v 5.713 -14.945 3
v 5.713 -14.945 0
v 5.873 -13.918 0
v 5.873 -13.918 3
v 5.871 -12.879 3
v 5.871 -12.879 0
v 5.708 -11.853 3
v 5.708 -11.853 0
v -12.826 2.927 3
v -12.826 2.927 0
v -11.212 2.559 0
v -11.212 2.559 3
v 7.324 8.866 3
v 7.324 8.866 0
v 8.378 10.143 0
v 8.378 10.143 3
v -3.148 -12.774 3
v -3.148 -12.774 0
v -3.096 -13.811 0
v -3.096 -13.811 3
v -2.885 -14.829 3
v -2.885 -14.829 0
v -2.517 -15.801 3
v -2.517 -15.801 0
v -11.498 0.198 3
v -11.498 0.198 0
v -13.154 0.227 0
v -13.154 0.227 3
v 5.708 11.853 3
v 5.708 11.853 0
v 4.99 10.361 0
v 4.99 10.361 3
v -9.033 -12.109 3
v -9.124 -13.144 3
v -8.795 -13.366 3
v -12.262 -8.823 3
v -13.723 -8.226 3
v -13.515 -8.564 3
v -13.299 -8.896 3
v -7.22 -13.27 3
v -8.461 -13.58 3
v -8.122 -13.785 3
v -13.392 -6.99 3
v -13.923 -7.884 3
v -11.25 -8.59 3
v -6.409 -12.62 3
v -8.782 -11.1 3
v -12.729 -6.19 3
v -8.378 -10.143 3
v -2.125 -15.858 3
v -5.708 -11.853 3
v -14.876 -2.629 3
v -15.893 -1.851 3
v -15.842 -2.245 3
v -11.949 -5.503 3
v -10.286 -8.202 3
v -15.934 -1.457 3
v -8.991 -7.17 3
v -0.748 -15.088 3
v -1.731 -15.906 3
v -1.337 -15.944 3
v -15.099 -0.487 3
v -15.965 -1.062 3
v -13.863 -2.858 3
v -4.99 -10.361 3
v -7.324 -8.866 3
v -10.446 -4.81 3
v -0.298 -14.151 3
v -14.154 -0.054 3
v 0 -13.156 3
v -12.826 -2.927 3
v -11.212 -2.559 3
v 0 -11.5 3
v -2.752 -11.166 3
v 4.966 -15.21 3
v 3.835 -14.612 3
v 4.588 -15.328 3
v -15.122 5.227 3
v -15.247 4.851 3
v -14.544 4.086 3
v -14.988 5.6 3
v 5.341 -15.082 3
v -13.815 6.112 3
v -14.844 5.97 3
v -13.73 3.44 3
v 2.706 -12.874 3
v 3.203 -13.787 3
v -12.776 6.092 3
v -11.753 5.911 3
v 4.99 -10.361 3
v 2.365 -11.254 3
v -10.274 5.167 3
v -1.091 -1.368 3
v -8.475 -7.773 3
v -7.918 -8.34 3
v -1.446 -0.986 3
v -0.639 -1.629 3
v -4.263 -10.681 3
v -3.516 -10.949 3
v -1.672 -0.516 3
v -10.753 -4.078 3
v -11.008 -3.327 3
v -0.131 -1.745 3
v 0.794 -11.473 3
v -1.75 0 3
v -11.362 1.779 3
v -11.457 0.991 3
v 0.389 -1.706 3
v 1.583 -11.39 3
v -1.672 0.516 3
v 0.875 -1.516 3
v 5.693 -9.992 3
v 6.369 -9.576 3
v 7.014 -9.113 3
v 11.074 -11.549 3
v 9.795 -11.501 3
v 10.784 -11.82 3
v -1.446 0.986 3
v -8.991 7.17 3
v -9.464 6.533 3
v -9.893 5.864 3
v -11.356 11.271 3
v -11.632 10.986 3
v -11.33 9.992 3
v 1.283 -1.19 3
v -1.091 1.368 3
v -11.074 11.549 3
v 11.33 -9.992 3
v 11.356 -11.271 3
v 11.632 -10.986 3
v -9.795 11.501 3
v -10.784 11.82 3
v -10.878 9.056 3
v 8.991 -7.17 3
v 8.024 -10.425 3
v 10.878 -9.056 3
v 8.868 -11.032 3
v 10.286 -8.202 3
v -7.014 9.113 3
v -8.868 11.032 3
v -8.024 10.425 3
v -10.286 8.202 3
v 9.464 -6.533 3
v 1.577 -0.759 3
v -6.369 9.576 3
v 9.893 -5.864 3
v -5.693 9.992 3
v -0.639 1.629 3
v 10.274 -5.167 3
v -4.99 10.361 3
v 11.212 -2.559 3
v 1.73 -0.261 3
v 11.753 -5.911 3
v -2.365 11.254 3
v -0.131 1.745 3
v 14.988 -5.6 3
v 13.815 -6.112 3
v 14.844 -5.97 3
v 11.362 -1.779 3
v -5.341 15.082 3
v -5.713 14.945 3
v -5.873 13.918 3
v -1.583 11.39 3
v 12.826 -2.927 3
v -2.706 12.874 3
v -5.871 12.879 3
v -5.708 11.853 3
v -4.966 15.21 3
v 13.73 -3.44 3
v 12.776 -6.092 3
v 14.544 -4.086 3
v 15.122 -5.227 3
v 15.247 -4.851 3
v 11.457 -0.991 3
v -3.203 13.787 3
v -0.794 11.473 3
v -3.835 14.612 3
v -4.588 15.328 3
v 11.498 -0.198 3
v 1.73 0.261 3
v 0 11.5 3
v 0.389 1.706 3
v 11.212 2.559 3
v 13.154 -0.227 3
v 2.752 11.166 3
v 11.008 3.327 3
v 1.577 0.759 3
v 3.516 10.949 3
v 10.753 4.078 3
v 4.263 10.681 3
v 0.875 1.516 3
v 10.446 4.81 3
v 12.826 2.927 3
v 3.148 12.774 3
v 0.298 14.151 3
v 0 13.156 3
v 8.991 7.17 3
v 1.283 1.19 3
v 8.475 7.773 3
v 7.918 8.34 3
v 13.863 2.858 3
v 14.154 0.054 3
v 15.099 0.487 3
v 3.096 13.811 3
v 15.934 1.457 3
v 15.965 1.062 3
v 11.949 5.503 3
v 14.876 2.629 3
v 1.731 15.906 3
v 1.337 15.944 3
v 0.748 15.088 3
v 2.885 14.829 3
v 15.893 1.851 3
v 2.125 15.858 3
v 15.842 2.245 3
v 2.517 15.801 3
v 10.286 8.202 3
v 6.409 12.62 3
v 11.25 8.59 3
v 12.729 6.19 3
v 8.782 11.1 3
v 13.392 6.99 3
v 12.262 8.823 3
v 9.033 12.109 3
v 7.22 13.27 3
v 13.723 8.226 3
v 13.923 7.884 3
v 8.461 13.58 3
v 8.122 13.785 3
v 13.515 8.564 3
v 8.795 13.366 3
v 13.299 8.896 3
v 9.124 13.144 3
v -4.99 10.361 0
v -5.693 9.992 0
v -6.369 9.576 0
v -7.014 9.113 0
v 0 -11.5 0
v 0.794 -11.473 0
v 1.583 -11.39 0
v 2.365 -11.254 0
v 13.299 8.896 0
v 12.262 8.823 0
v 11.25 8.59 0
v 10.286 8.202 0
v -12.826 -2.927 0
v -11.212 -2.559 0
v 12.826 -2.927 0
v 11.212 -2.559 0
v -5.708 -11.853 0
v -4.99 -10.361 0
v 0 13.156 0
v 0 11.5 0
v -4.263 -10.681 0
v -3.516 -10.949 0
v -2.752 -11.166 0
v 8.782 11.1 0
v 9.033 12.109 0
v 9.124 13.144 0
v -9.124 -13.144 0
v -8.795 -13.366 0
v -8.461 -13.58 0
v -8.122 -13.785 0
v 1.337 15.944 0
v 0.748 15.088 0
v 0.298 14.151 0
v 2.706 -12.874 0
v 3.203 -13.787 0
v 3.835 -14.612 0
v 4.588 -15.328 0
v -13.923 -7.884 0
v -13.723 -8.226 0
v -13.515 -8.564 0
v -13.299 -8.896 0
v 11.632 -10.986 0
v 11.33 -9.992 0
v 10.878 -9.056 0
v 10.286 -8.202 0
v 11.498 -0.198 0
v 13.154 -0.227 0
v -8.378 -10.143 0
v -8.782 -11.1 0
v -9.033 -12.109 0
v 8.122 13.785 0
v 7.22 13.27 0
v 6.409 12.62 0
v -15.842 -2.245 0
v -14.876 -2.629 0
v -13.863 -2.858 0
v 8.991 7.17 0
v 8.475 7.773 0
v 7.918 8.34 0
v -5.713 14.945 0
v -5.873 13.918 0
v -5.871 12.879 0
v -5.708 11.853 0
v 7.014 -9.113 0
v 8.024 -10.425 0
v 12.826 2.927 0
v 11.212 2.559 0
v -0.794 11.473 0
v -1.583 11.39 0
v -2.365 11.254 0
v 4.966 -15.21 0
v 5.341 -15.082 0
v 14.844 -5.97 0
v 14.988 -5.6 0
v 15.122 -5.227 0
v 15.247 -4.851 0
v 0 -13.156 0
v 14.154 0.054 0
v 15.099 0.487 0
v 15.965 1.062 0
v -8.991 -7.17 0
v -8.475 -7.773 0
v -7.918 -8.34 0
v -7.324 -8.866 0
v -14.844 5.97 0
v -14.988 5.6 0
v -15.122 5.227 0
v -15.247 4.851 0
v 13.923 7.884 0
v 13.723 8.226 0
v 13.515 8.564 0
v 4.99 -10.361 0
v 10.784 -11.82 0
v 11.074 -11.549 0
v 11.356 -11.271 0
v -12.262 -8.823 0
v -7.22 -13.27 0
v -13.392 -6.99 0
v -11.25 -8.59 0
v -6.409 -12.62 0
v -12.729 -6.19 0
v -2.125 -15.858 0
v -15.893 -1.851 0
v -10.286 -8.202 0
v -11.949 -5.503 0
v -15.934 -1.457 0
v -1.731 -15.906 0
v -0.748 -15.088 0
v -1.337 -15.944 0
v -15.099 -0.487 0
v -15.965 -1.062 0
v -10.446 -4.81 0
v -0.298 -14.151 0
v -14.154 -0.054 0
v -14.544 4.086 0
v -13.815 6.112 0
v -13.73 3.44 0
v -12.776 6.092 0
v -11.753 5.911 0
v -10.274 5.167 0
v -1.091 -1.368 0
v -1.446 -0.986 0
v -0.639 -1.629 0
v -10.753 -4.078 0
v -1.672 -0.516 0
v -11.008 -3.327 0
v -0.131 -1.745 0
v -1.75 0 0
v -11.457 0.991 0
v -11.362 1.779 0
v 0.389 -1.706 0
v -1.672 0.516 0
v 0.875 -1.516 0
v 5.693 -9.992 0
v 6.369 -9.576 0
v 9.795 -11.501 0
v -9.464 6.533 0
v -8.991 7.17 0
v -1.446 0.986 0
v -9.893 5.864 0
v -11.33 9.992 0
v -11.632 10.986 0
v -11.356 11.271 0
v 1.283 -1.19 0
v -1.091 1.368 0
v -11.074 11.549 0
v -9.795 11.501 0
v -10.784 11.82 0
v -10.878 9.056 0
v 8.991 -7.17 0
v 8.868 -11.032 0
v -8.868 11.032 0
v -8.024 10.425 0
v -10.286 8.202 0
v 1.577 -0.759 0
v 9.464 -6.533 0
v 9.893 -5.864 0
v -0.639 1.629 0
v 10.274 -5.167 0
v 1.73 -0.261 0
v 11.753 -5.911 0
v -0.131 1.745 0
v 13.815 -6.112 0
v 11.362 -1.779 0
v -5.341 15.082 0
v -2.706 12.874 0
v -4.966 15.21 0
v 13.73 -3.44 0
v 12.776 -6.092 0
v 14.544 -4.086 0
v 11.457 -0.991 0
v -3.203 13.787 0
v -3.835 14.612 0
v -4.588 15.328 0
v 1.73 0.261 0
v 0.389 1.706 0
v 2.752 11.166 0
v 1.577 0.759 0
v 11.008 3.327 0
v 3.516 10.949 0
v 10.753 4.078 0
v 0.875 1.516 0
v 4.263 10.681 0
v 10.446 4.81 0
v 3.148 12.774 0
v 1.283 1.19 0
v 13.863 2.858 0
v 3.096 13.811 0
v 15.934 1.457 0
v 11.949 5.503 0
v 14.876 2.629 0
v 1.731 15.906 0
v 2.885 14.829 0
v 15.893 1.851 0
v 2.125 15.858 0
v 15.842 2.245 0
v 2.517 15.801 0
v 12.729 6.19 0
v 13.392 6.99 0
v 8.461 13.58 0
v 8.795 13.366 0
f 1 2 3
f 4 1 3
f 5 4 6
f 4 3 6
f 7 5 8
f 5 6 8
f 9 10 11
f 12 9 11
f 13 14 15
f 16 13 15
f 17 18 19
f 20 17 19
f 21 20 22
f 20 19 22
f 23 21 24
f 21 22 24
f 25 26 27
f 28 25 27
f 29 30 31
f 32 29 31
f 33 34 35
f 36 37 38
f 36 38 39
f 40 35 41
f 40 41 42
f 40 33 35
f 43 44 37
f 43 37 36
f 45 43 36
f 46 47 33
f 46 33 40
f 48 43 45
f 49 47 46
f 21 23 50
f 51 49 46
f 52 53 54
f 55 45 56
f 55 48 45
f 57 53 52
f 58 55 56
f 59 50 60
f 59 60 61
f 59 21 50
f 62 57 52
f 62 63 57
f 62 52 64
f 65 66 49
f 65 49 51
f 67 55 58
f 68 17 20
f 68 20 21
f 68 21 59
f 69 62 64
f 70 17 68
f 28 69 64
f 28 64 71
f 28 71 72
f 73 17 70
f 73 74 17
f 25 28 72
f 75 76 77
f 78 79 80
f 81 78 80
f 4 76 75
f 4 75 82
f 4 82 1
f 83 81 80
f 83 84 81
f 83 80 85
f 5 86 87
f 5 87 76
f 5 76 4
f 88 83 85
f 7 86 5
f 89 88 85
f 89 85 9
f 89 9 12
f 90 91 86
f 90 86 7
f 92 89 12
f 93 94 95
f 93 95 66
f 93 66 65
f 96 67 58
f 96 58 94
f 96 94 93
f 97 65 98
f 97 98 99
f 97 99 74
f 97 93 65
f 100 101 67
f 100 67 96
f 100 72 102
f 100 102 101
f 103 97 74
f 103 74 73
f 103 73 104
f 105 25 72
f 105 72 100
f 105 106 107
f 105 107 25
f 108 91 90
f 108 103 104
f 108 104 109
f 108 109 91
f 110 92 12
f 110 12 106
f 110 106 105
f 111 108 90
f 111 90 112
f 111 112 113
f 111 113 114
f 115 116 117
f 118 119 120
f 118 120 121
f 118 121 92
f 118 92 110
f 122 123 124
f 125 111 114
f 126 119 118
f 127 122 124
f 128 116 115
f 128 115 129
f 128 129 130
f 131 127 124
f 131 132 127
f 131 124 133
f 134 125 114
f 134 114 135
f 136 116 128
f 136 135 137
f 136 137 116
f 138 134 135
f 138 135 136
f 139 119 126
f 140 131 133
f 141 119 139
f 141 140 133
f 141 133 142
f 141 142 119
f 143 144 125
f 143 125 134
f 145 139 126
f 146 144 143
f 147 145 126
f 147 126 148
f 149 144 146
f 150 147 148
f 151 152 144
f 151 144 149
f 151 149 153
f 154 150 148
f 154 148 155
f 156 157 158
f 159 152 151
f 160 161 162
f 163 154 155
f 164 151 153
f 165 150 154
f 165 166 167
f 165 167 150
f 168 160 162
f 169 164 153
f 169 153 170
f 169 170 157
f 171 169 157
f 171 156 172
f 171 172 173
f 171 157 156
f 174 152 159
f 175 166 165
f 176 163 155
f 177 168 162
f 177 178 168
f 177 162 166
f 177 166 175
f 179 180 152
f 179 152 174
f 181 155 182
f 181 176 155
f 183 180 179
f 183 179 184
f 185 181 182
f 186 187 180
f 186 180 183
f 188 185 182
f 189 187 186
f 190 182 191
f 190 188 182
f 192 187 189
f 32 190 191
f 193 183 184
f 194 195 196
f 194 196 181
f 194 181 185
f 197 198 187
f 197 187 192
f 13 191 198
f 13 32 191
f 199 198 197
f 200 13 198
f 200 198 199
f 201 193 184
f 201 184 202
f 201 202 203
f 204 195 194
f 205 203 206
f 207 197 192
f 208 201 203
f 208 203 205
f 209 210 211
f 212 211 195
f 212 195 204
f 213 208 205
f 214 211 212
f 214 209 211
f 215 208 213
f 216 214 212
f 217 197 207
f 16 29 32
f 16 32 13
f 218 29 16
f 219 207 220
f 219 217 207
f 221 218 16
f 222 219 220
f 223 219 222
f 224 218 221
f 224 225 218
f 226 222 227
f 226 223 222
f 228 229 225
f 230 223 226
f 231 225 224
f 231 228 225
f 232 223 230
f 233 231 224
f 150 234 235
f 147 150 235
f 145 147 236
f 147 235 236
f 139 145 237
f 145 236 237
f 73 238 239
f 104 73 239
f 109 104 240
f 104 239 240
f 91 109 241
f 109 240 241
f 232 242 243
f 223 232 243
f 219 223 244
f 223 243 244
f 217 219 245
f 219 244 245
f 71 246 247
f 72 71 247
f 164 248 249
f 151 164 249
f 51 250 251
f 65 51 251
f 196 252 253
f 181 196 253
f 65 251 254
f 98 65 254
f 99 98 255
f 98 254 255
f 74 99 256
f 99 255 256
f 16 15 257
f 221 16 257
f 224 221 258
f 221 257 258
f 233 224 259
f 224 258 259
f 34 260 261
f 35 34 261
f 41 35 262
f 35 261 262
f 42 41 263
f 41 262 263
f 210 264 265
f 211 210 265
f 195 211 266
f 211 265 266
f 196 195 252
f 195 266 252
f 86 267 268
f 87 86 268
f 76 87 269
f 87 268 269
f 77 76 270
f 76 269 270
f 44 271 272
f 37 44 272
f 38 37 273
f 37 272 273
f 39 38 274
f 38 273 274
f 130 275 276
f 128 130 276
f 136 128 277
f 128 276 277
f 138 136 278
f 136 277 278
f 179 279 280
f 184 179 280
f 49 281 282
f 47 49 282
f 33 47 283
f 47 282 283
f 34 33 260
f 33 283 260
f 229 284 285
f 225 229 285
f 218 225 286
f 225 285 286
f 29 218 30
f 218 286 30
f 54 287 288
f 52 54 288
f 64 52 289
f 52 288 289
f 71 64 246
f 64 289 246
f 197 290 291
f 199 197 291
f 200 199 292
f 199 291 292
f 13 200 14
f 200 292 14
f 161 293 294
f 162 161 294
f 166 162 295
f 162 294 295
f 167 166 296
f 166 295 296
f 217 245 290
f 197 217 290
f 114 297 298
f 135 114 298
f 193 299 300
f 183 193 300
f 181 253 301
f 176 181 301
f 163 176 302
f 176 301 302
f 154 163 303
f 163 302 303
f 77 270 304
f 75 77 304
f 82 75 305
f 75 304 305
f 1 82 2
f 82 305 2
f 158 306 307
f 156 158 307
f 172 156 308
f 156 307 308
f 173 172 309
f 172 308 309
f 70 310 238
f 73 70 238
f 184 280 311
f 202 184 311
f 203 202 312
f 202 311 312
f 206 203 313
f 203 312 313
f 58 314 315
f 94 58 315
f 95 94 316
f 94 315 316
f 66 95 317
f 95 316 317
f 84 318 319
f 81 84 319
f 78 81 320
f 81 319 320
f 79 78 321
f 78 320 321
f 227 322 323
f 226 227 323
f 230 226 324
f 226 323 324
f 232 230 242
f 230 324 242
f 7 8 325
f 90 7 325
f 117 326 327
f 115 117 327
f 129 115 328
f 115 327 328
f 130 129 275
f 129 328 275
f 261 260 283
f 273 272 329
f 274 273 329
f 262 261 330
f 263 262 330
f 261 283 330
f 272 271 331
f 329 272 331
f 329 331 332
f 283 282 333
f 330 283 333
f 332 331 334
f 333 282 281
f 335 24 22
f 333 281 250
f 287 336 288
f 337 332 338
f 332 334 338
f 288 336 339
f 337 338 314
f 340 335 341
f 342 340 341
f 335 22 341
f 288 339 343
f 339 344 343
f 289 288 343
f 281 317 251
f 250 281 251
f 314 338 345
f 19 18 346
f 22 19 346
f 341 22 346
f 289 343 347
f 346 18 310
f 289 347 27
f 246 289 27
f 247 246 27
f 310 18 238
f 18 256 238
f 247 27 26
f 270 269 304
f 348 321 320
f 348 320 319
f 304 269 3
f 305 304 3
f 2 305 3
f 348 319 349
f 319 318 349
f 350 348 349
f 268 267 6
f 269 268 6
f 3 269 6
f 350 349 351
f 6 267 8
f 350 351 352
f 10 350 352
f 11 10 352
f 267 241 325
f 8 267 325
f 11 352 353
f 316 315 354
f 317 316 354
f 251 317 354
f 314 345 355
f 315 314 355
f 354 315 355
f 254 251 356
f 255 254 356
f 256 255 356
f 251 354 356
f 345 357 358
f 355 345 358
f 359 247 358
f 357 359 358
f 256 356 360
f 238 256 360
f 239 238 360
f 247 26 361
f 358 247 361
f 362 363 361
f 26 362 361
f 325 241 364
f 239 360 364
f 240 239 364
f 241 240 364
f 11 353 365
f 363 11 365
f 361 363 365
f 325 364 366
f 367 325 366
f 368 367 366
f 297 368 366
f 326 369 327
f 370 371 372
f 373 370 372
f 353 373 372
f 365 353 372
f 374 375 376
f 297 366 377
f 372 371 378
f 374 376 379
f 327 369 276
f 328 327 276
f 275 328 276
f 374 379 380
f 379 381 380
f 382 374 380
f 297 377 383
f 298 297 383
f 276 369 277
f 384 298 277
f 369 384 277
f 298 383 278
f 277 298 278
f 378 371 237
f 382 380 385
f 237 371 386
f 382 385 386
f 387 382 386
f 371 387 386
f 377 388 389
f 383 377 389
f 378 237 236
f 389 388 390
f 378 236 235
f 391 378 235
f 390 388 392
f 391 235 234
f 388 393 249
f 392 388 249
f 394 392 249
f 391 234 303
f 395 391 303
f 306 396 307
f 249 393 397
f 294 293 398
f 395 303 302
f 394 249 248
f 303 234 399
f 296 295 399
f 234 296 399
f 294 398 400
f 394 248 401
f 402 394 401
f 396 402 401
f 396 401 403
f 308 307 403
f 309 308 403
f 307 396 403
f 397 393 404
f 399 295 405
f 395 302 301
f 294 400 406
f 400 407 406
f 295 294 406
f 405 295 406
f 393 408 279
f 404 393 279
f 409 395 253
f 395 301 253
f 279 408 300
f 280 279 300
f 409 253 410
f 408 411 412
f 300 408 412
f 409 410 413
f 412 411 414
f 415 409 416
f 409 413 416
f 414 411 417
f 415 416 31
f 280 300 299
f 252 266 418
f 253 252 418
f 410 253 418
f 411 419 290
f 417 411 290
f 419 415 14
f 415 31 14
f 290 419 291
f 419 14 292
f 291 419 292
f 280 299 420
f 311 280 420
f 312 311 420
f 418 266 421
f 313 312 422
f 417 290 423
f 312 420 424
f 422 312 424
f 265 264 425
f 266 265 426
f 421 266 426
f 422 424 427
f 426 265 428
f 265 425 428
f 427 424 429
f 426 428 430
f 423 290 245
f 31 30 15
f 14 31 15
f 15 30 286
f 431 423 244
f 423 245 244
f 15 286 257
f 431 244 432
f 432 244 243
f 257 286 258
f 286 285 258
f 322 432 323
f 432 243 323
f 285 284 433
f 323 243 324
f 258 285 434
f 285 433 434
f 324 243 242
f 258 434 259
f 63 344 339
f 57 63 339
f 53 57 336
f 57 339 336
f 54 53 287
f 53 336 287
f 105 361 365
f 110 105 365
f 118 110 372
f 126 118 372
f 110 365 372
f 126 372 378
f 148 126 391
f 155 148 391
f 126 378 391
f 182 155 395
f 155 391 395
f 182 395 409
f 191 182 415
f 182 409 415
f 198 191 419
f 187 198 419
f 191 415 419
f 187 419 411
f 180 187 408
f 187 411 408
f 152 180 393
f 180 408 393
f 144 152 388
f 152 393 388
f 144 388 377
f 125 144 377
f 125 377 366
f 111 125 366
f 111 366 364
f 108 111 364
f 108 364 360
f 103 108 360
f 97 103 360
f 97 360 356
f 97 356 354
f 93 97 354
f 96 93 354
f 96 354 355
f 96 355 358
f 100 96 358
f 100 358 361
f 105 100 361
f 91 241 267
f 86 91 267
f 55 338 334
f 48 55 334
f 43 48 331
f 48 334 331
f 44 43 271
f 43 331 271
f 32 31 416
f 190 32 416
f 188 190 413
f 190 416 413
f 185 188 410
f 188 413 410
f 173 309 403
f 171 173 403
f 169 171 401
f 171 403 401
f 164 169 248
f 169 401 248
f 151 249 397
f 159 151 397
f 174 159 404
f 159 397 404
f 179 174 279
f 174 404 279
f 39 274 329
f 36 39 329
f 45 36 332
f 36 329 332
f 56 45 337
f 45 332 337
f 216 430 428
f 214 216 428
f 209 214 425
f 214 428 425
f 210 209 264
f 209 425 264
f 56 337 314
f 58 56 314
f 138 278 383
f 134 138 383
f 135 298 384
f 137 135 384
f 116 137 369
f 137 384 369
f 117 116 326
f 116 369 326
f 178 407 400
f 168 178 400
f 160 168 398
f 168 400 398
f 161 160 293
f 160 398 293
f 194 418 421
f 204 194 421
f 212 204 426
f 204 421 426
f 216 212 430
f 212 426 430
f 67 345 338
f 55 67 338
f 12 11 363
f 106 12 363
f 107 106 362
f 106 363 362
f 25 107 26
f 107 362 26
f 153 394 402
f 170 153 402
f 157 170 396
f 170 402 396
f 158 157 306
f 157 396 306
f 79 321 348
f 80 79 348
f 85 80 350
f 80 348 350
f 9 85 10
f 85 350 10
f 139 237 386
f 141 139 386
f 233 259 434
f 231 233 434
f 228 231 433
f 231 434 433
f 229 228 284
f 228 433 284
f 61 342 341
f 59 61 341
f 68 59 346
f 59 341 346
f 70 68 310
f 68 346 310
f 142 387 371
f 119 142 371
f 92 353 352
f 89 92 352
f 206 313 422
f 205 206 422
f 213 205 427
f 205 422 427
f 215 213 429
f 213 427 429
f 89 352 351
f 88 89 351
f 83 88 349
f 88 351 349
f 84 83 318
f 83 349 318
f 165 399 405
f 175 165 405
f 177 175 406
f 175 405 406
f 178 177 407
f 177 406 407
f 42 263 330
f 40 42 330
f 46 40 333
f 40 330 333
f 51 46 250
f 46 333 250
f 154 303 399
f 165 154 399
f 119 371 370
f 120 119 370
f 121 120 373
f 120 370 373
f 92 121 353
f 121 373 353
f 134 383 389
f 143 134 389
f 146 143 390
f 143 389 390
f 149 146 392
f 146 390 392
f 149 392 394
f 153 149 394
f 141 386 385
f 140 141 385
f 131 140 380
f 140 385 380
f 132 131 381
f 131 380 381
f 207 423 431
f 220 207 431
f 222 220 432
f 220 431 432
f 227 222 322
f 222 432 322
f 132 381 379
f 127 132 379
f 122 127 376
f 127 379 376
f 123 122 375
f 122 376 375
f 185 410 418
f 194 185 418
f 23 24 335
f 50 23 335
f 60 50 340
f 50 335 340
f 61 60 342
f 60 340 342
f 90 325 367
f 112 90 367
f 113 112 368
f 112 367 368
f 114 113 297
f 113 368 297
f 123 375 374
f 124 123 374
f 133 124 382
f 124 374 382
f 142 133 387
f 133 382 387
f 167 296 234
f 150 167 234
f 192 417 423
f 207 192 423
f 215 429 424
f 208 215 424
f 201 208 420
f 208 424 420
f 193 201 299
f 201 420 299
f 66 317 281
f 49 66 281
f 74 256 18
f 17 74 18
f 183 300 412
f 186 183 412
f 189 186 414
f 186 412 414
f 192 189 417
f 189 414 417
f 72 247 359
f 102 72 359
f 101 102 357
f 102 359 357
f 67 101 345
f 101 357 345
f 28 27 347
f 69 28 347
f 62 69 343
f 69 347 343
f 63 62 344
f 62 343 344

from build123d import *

# Parameters (mm, degrees)
BOSS_EXTRU_1_DEPTH           = 3
R_P_TITION_CIRCULAIRE2_COUNT = 14
ESQUISSE5_R                  = 11.5
BOSS_EXTRU_2_DEPTH           = 3
ESQUISSE6_R                  = 1.75
ENL_V_MAT_EXTRU_1_DEPTH      = 4


with BuildPart() as part:
    # Esquisse4 → Boss.-Extru.1 (new body)
    with BuildSketch(Plane.XY):
        with BuildLine():
            Line((0, 13.155696691), (0, 11.5))
            ThreePointArc((0, 11.5), (1.385979557, 11.416175396), (2.751754038, 11.165923594))
            Line((2.751754038, 11.165923594), (3.147934042, 12.773522094))
            ThreePointArc((3.147934042, 12.773522094), (3.010357566, 14.324173734), (2.517223611, 15.800746352))
            ThreePointArc((2.517223611, 15.800746352), (1.928319383, 15.883374464), (1.336751397, 15.944061456))
            ThreePointArc((1.336751397, 15.944061456), (0.504624377, 14.628382005), (0, 13.155696691))
        make_face()
    extrude(amount=BOSS_EXTRU_1_DEPTH)


with BuildPart() as r_p_tition_circulaire2_1:
    # Répétition circulaire2: pattern copy
    add(part.part.rotate(Axis((0, 0, 0), (0, 0, 1)), 1 * 360 / R_P_TITION_CIRCULAIRE2_COUNT))


with BuildPart() as r_p_tition_circulaire2_2:
    # Répétition circulaire2: pattern copy
    add(part.part.rotate(Axis((0, 0, 0), (0, 0, 1)), 2 * 360 / R_P_TITION_CIRCULAIRE2_COUNT))


with BuildPart() as r_p_tition_circulaire2_3:
    # Répétition circulaire2: pattern copy
    add(part.part.rotate(Axis((0, 0, 0), (0, 0, 1)), 3 * 360 / R_P_TITION_CIRCULAIRE2_COUNT))


with BuildPart() as r_p_tition_circulaire2_4:
    # Répétition circulaire2: pattern copy
    add(part.part.rotate(Axis((0, 0, 0), (0, 0, 1)), 4 * 360 / R_P_TITION_CIRCULAIRE2_COUNT))


with BuildPart() as r_p_tition_circulaire2_5:
    # Répétition circulaire2: pattern copy
    add(part.part.rotate(Axis((0, 0, 0), (0, 0, 1)), 5 * 360 / R_P_TITION_CIRCULAIRE2_COUNT))


with BuildPart() as r_p_tition_circulaire2_6:
    # Répétition circulaire2: pattern copy
    add(part.part.rotate(Axis((0, 0, 0), (0, 0, 1)), 6 * 360 / R_P_TITION_CIRCULAIRE2_COUNT))


with BuildPart() as r_p_tition_circulaire2_7:
    # Répétition circulaire2: pattern copy
    add(part.part.rotate(Axis((0, 0, 0), (0, 0, 1)), 7 * 360 / R_P_TITION_CIRCULAIRE2_COUNT))


with BuildPart() as r_p_tition_circulaire2_8:
    # Répétition circulaire2: pattern copy
    add(part.part.rotate(Axis((0, 0, 0), (0, 0, 1)), 8 * 360 / R_P_TITION_CIRCULAIRE2_COUNT))


with BuildPart() as r_p_tition_circulaire2_9:
    # Répétition circulaire2: pattern copy
    add(part.part.rotate(Axis((0, 0, 0), (0, 0, 1)), 9 * 360 / R_P_TITION_CIRCULAIRE2_COUNT))


with BuildPart() as r_p_tition_circulaire2_10:
    # Répétition circulaire2: pattern copy
    add(part.part.rotate(Axis((0, 0, 0), (0, 0, 1)), 10 * 360 / R_P_TITION_CIRCULAIRE2_COUNT))


with BuildPart() as r_p_tition_circulaire2_11:
    # Répétition circulaire2: pattern copy
    add(part.part.rotate(Axis((0, 0, 0), (0, 0, 1)), 11 * 360 / R_P_TITION_CIRCULAIRE2_COUNT))


with BuildPart() as r_p_tition_circulaire2_12:
    # Répétition circulaire2: pattern copy
    add(part.part.rotate(Axis((0, 0, 0), (0, 0, 1)), 12 * 360 / R_P_TITION_CIRCULAIRE2_COUNT))


with BuildPart() as r_p_tition_circulaire2_13:
    # Répétition circulaire2: pattern copy
    add(part.part.rotate(Axis((0, 0, 0), (0, 0, 1)), 13 * 360 / R_P_TITION_CIRCULAIRE2_COUNT))


with BuildPart() as part_1:
    add(part.part)

    add(r_p_tition_circulaire2_1.part)  # Boss.-Extru.2 merges Répétition circulaire2_1

    add(r_p_tition_circulaire2_2.part)  # Boss.-Extru.2 merges Répétition circulaire2_2

    add(r_p_tition_circulaire2_3.part)  # Boss.-Extru.2 merges Répétition circulaire2_3

    add(r_p_tition_circulaire2_4.part)  # Boss.-Extru.2 merges Répétition circulaire2_4

    add(r_p_tition_circulaire2_5.part)  # Boss.-Extru.2 merges Répétition circulaire2_5

    add(r_p_tition_circulaire2_6.part)  # Boss.-Extru.2 merges Répétition circulaire2_6

    add(r_p_tition_circulaire2_7.part)  # Boss.-Extru.2 merges Répétition circulaire2_7

    add(r_p_tition_circulaire2_8.part)  # Boss.-Extru.2 merges Répétition circulaire2_8

    add(r_p_tition_circulaire2_9.part)  # Boss.-Extru.2 merges Répétition circulaire2_9

    add(r_p_tition_circulaire2_10.part)  # Boss.-Extru.2 merges Répétition circulaire2_10

    add(r_p_tition_circulaire2_11.part)  # Boss.-Extru.2 merges Répétition circulaire2_11

    add(r_p_tition_circulaire2_12.part)  # Boss.-Extru.2 merges Répétition circulaire2_12

    add(r_p_tition_circulaire2_13.part)  # Boss.-Extru.2 merges Répétition circulaire2_13
    # Esquisse5 → Boss.-Extru.2 (add)
    with BuildSketch(Plane.XY):
        Circle(ESQUISSE5_R)
    extrude(amount=BOSS_EXTRU_2_DEPTH)

    # Esquisse6 → Enlèv. mat.-Extru.1 (cut, through all)
    with BuildSketch(Plane(origin=(0, 0, 0), x_dir=(-1, 0, 0), z_dir=(0, 0, -1))):
        Circle(ESQUISSE6_R)
    extrude(amount=-ENL_V_MAT_EXTRU_1_DEPTH, mode=Mode.SUBTRACT)


solid = part_1.part
